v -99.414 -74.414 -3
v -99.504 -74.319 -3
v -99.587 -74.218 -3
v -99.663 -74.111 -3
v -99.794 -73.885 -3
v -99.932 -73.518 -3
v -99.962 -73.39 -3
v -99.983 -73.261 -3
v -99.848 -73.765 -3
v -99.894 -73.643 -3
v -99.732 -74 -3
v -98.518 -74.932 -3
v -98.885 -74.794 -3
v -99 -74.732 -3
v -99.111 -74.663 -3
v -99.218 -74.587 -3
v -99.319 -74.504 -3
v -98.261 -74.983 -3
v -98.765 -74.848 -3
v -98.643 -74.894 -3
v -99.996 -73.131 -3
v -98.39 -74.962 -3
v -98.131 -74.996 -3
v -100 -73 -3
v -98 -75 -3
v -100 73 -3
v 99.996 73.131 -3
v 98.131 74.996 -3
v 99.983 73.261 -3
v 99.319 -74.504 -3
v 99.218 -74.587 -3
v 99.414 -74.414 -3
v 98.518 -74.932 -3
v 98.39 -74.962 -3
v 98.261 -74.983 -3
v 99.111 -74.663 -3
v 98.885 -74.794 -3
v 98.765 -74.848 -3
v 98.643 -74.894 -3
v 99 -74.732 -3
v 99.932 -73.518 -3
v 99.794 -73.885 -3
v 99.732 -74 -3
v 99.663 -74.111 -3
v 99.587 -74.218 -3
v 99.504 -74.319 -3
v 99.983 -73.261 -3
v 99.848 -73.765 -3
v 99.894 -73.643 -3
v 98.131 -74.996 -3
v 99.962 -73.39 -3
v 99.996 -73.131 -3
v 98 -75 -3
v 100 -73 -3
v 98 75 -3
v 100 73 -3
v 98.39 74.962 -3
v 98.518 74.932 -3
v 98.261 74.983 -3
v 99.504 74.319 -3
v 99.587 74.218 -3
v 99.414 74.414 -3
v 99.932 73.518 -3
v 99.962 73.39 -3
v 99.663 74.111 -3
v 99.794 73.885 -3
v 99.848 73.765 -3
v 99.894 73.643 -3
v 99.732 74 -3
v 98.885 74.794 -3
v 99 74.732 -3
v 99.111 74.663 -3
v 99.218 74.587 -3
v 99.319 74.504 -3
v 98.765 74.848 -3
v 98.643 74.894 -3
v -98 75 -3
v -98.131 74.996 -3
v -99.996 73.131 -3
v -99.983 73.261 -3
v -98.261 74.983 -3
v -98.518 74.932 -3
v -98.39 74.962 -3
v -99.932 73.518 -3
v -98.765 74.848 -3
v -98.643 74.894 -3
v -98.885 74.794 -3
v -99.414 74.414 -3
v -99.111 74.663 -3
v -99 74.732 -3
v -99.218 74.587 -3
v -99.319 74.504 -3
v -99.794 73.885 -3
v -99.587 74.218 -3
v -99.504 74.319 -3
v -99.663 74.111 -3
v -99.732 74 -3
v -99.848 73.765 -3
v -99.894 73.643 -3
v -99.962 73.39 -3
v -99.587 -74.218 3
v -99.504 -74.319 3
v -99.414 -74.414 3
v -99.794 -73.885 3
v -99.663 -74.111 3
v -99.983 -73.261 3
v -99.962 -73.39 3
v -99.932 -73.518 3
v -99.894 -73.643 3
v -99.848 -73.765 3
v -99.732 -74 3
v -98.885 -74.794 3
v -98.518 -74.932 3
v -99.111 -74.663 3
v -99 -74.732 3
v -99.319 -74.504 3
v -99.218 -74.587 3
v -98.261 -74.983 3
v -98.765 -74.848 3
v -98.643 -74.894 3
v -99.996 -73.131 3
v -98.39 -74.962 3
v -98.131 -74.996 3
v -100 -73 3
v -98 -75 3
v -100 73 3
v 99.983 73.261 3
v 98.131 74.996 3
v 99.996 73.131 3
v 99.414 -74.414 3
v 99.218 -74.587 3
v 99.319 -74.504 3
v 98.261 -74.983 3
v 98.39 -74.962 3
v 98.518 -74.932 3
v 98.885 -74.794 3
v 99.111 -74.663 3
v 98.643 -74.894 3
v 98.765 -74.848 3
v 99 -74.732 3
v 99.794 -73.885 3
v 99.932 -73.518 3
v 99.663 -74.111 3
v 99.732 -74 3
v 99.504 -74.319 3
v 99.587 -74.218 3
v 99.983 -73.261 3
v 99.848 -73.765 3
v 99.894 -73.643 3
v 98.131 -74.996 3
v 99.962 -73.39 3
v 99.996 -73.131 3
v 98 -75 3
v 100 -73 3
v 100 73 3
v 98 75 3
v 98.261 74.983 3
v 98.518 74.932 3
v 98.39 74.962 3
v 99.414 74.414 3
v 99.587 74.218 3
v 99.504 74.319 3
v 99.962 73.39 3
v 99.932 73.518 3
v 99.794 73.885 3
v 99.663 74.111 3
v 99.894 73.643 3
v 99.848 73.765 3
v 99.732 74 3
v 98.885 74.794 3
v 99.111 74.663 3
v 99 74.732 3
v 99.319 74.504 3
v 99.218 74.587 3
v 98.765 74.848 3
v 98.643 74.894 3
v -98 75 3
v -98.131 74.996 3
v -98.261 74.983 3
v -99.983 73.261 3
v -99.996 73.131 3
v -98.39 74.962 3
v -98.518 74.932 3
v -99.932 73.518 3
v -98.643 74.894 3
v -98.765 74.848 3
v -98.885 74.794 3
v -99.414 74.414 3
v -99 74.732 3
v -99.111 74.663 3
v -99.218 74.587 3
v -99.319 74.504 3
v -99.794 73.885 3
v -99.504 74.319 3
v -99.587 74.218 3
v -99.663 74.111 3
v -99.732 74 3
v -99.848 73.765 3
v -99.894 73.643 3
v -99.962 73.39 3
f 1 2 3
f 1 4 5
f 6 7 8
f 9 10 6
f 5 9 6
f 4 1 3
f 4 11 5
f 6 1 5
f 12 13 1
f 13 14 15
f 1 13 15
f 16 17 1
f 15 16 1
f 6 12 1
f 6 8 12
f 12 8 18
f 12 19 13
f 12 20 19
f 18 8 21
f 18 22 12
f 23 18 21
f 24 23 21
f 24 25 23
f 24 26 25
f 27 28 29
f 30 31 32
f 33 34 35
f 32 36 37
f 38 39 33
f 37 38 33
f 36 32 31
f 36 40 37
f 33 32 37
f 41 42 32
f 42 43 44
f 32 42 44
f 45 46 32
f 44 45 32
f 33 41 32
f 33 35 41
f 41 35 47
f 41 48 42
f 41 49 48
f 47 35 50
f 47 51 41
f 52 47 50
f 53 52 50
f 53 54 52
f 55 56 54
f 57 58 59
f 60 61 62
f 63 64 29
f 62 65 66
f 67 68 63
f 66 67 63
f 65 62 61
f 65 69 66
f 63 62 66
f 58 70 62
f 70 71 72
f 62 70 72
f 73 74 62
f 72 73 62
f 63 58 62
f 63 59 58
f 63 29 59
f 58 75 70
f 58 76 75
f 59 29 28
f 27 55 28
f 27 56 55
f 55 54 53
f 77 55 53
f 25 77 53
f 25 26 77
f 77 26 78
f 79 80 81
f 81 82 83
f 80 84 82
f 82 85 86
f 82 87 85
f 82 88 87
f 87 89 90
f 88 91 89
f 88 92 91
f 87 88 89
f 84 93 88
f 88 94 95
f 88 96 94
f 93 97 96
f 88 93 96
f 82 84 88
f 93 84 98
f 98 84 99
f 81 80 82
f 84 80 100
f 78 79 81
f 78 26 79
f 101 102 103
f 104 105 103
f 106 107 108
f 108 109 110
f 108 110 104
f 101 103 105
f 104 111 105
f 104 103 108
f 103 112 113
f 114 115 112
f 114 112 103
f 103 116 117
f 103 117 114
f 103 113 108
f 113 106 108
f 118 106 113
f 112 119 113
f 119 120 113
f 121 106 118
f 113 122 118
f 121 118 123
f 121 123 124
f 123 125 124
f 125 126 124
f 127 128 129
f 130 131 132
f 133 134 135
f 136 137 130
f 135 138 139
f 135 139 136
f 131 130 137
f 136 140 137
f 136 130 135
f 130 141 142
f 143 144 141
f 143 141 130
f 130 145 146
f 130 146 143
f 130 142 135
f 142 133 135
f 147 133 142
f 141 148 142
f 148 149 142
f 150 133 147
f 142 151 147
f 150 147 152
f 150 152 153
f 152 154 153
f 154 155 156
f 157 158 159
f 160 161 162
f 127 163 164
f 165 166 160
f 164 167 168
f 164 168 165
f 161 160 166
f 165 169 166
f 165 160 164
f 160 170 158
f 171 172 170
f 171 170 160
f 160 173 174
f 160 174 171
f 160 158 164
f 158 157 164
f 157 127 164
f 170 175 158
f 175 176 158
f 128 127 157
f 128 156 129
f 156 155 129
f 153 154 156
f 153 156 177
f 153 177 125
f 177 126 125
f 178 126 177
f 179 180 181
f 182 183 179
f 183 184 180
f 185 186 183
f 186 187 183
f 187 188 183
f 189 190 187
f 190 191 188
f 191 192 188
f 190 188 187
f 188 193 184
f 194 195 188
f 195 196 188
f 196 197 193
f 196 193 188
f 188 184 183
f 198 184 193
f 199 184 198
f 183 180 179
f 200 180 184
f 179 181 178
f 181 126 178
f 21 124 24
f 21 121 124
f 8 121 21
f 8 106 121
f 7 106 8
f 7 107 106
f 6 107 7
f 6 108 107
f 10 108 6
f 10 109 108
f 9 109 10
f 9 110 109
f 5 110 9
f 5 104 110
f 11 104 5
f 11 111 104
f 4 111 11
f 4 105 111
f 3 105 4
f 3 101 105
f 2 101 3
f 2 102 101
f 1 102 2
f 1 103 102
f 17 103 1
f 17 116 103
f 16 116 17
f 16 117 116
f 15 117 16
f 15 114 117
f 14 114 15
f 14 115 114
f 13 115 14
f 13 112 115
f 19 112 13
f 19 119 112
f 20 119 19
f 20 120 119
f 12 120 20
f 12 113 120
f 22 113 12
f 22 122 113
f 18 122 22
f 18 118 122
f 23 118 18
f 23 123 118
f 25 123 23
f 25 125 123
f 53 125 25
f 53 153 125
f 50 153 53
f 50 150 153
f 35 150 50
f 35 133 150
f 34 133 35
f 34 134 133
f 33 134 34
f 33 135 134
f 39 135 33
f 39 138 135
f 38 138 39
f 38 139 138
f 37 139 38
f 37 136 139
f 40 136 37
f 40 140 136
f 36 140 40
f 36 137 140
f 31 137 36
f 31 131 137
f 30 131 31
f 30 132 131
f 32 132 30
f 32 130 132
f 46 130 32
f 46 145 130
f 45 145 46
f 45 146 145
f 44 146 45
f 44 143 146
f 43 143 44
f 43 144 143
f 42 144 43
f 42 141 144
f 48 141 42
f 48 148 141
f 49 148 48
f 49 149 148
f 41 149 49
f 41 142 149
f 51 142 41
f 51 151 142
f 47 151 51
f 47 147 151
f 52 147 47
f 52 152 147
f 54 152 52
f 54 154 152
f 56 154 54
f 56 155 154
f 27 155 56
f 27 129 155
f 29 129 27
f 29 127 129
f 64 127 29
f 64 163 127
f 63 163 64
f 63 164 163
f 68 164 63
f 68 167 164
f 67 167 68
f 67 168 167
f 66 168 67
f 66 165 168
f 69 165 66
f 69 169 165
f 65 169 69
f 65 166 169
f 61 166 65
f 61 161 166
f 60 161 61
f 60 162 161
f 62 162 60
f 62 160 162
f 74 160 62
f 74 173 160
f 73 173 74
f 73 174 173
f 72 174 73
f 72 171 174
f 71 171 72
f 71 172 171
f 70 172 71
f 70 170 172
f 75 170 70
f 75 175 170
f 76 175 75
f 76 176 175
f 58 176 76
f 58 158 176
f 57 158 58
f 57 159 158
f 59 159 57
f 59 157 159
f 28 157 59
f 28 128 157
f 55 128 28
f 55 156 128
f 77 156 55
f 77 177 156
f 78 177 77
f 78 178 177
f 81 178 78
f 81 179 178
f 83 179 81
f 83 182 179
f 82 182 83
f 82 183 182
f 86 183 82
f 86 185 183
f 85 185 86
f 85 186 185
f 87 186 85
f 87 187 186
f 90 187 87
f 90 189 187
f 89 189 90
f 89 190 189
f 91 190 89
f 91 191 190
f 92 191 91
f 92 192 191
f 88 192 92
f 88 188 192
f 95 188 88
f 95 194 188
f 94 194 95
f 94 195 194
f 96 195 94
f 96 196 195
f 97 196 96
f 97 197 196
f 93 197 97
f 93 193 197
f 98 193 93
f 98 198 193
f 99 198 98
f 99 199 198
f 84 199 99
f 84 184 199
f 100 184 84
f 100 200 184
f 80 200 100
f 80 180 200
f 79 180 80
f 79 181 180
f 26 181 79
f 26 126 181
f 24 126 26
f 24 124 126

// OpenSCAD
$fn = 96;

length = 200;
width  = 150;
thickness = 6;

corner_radius = 2;

module rounded_plate(l, w, t, r){
    r2 = min(r, l/2, w/2);

    // Robust rounded rectangle via hull of corner circles, then extrude.
    linear_extrude(height = t, center = true, convexity = 10)
        hull()
            for (sx = [-1, 1], sy = [-1, 1])
                translate([sx*(l/2 - r2), sy*(w/2 - r2), 0])
                    circle(r = r2);
}

color([0.75, 0.78, 0.82])
    rounded_plate(length, width, thickness, corner_radius);
